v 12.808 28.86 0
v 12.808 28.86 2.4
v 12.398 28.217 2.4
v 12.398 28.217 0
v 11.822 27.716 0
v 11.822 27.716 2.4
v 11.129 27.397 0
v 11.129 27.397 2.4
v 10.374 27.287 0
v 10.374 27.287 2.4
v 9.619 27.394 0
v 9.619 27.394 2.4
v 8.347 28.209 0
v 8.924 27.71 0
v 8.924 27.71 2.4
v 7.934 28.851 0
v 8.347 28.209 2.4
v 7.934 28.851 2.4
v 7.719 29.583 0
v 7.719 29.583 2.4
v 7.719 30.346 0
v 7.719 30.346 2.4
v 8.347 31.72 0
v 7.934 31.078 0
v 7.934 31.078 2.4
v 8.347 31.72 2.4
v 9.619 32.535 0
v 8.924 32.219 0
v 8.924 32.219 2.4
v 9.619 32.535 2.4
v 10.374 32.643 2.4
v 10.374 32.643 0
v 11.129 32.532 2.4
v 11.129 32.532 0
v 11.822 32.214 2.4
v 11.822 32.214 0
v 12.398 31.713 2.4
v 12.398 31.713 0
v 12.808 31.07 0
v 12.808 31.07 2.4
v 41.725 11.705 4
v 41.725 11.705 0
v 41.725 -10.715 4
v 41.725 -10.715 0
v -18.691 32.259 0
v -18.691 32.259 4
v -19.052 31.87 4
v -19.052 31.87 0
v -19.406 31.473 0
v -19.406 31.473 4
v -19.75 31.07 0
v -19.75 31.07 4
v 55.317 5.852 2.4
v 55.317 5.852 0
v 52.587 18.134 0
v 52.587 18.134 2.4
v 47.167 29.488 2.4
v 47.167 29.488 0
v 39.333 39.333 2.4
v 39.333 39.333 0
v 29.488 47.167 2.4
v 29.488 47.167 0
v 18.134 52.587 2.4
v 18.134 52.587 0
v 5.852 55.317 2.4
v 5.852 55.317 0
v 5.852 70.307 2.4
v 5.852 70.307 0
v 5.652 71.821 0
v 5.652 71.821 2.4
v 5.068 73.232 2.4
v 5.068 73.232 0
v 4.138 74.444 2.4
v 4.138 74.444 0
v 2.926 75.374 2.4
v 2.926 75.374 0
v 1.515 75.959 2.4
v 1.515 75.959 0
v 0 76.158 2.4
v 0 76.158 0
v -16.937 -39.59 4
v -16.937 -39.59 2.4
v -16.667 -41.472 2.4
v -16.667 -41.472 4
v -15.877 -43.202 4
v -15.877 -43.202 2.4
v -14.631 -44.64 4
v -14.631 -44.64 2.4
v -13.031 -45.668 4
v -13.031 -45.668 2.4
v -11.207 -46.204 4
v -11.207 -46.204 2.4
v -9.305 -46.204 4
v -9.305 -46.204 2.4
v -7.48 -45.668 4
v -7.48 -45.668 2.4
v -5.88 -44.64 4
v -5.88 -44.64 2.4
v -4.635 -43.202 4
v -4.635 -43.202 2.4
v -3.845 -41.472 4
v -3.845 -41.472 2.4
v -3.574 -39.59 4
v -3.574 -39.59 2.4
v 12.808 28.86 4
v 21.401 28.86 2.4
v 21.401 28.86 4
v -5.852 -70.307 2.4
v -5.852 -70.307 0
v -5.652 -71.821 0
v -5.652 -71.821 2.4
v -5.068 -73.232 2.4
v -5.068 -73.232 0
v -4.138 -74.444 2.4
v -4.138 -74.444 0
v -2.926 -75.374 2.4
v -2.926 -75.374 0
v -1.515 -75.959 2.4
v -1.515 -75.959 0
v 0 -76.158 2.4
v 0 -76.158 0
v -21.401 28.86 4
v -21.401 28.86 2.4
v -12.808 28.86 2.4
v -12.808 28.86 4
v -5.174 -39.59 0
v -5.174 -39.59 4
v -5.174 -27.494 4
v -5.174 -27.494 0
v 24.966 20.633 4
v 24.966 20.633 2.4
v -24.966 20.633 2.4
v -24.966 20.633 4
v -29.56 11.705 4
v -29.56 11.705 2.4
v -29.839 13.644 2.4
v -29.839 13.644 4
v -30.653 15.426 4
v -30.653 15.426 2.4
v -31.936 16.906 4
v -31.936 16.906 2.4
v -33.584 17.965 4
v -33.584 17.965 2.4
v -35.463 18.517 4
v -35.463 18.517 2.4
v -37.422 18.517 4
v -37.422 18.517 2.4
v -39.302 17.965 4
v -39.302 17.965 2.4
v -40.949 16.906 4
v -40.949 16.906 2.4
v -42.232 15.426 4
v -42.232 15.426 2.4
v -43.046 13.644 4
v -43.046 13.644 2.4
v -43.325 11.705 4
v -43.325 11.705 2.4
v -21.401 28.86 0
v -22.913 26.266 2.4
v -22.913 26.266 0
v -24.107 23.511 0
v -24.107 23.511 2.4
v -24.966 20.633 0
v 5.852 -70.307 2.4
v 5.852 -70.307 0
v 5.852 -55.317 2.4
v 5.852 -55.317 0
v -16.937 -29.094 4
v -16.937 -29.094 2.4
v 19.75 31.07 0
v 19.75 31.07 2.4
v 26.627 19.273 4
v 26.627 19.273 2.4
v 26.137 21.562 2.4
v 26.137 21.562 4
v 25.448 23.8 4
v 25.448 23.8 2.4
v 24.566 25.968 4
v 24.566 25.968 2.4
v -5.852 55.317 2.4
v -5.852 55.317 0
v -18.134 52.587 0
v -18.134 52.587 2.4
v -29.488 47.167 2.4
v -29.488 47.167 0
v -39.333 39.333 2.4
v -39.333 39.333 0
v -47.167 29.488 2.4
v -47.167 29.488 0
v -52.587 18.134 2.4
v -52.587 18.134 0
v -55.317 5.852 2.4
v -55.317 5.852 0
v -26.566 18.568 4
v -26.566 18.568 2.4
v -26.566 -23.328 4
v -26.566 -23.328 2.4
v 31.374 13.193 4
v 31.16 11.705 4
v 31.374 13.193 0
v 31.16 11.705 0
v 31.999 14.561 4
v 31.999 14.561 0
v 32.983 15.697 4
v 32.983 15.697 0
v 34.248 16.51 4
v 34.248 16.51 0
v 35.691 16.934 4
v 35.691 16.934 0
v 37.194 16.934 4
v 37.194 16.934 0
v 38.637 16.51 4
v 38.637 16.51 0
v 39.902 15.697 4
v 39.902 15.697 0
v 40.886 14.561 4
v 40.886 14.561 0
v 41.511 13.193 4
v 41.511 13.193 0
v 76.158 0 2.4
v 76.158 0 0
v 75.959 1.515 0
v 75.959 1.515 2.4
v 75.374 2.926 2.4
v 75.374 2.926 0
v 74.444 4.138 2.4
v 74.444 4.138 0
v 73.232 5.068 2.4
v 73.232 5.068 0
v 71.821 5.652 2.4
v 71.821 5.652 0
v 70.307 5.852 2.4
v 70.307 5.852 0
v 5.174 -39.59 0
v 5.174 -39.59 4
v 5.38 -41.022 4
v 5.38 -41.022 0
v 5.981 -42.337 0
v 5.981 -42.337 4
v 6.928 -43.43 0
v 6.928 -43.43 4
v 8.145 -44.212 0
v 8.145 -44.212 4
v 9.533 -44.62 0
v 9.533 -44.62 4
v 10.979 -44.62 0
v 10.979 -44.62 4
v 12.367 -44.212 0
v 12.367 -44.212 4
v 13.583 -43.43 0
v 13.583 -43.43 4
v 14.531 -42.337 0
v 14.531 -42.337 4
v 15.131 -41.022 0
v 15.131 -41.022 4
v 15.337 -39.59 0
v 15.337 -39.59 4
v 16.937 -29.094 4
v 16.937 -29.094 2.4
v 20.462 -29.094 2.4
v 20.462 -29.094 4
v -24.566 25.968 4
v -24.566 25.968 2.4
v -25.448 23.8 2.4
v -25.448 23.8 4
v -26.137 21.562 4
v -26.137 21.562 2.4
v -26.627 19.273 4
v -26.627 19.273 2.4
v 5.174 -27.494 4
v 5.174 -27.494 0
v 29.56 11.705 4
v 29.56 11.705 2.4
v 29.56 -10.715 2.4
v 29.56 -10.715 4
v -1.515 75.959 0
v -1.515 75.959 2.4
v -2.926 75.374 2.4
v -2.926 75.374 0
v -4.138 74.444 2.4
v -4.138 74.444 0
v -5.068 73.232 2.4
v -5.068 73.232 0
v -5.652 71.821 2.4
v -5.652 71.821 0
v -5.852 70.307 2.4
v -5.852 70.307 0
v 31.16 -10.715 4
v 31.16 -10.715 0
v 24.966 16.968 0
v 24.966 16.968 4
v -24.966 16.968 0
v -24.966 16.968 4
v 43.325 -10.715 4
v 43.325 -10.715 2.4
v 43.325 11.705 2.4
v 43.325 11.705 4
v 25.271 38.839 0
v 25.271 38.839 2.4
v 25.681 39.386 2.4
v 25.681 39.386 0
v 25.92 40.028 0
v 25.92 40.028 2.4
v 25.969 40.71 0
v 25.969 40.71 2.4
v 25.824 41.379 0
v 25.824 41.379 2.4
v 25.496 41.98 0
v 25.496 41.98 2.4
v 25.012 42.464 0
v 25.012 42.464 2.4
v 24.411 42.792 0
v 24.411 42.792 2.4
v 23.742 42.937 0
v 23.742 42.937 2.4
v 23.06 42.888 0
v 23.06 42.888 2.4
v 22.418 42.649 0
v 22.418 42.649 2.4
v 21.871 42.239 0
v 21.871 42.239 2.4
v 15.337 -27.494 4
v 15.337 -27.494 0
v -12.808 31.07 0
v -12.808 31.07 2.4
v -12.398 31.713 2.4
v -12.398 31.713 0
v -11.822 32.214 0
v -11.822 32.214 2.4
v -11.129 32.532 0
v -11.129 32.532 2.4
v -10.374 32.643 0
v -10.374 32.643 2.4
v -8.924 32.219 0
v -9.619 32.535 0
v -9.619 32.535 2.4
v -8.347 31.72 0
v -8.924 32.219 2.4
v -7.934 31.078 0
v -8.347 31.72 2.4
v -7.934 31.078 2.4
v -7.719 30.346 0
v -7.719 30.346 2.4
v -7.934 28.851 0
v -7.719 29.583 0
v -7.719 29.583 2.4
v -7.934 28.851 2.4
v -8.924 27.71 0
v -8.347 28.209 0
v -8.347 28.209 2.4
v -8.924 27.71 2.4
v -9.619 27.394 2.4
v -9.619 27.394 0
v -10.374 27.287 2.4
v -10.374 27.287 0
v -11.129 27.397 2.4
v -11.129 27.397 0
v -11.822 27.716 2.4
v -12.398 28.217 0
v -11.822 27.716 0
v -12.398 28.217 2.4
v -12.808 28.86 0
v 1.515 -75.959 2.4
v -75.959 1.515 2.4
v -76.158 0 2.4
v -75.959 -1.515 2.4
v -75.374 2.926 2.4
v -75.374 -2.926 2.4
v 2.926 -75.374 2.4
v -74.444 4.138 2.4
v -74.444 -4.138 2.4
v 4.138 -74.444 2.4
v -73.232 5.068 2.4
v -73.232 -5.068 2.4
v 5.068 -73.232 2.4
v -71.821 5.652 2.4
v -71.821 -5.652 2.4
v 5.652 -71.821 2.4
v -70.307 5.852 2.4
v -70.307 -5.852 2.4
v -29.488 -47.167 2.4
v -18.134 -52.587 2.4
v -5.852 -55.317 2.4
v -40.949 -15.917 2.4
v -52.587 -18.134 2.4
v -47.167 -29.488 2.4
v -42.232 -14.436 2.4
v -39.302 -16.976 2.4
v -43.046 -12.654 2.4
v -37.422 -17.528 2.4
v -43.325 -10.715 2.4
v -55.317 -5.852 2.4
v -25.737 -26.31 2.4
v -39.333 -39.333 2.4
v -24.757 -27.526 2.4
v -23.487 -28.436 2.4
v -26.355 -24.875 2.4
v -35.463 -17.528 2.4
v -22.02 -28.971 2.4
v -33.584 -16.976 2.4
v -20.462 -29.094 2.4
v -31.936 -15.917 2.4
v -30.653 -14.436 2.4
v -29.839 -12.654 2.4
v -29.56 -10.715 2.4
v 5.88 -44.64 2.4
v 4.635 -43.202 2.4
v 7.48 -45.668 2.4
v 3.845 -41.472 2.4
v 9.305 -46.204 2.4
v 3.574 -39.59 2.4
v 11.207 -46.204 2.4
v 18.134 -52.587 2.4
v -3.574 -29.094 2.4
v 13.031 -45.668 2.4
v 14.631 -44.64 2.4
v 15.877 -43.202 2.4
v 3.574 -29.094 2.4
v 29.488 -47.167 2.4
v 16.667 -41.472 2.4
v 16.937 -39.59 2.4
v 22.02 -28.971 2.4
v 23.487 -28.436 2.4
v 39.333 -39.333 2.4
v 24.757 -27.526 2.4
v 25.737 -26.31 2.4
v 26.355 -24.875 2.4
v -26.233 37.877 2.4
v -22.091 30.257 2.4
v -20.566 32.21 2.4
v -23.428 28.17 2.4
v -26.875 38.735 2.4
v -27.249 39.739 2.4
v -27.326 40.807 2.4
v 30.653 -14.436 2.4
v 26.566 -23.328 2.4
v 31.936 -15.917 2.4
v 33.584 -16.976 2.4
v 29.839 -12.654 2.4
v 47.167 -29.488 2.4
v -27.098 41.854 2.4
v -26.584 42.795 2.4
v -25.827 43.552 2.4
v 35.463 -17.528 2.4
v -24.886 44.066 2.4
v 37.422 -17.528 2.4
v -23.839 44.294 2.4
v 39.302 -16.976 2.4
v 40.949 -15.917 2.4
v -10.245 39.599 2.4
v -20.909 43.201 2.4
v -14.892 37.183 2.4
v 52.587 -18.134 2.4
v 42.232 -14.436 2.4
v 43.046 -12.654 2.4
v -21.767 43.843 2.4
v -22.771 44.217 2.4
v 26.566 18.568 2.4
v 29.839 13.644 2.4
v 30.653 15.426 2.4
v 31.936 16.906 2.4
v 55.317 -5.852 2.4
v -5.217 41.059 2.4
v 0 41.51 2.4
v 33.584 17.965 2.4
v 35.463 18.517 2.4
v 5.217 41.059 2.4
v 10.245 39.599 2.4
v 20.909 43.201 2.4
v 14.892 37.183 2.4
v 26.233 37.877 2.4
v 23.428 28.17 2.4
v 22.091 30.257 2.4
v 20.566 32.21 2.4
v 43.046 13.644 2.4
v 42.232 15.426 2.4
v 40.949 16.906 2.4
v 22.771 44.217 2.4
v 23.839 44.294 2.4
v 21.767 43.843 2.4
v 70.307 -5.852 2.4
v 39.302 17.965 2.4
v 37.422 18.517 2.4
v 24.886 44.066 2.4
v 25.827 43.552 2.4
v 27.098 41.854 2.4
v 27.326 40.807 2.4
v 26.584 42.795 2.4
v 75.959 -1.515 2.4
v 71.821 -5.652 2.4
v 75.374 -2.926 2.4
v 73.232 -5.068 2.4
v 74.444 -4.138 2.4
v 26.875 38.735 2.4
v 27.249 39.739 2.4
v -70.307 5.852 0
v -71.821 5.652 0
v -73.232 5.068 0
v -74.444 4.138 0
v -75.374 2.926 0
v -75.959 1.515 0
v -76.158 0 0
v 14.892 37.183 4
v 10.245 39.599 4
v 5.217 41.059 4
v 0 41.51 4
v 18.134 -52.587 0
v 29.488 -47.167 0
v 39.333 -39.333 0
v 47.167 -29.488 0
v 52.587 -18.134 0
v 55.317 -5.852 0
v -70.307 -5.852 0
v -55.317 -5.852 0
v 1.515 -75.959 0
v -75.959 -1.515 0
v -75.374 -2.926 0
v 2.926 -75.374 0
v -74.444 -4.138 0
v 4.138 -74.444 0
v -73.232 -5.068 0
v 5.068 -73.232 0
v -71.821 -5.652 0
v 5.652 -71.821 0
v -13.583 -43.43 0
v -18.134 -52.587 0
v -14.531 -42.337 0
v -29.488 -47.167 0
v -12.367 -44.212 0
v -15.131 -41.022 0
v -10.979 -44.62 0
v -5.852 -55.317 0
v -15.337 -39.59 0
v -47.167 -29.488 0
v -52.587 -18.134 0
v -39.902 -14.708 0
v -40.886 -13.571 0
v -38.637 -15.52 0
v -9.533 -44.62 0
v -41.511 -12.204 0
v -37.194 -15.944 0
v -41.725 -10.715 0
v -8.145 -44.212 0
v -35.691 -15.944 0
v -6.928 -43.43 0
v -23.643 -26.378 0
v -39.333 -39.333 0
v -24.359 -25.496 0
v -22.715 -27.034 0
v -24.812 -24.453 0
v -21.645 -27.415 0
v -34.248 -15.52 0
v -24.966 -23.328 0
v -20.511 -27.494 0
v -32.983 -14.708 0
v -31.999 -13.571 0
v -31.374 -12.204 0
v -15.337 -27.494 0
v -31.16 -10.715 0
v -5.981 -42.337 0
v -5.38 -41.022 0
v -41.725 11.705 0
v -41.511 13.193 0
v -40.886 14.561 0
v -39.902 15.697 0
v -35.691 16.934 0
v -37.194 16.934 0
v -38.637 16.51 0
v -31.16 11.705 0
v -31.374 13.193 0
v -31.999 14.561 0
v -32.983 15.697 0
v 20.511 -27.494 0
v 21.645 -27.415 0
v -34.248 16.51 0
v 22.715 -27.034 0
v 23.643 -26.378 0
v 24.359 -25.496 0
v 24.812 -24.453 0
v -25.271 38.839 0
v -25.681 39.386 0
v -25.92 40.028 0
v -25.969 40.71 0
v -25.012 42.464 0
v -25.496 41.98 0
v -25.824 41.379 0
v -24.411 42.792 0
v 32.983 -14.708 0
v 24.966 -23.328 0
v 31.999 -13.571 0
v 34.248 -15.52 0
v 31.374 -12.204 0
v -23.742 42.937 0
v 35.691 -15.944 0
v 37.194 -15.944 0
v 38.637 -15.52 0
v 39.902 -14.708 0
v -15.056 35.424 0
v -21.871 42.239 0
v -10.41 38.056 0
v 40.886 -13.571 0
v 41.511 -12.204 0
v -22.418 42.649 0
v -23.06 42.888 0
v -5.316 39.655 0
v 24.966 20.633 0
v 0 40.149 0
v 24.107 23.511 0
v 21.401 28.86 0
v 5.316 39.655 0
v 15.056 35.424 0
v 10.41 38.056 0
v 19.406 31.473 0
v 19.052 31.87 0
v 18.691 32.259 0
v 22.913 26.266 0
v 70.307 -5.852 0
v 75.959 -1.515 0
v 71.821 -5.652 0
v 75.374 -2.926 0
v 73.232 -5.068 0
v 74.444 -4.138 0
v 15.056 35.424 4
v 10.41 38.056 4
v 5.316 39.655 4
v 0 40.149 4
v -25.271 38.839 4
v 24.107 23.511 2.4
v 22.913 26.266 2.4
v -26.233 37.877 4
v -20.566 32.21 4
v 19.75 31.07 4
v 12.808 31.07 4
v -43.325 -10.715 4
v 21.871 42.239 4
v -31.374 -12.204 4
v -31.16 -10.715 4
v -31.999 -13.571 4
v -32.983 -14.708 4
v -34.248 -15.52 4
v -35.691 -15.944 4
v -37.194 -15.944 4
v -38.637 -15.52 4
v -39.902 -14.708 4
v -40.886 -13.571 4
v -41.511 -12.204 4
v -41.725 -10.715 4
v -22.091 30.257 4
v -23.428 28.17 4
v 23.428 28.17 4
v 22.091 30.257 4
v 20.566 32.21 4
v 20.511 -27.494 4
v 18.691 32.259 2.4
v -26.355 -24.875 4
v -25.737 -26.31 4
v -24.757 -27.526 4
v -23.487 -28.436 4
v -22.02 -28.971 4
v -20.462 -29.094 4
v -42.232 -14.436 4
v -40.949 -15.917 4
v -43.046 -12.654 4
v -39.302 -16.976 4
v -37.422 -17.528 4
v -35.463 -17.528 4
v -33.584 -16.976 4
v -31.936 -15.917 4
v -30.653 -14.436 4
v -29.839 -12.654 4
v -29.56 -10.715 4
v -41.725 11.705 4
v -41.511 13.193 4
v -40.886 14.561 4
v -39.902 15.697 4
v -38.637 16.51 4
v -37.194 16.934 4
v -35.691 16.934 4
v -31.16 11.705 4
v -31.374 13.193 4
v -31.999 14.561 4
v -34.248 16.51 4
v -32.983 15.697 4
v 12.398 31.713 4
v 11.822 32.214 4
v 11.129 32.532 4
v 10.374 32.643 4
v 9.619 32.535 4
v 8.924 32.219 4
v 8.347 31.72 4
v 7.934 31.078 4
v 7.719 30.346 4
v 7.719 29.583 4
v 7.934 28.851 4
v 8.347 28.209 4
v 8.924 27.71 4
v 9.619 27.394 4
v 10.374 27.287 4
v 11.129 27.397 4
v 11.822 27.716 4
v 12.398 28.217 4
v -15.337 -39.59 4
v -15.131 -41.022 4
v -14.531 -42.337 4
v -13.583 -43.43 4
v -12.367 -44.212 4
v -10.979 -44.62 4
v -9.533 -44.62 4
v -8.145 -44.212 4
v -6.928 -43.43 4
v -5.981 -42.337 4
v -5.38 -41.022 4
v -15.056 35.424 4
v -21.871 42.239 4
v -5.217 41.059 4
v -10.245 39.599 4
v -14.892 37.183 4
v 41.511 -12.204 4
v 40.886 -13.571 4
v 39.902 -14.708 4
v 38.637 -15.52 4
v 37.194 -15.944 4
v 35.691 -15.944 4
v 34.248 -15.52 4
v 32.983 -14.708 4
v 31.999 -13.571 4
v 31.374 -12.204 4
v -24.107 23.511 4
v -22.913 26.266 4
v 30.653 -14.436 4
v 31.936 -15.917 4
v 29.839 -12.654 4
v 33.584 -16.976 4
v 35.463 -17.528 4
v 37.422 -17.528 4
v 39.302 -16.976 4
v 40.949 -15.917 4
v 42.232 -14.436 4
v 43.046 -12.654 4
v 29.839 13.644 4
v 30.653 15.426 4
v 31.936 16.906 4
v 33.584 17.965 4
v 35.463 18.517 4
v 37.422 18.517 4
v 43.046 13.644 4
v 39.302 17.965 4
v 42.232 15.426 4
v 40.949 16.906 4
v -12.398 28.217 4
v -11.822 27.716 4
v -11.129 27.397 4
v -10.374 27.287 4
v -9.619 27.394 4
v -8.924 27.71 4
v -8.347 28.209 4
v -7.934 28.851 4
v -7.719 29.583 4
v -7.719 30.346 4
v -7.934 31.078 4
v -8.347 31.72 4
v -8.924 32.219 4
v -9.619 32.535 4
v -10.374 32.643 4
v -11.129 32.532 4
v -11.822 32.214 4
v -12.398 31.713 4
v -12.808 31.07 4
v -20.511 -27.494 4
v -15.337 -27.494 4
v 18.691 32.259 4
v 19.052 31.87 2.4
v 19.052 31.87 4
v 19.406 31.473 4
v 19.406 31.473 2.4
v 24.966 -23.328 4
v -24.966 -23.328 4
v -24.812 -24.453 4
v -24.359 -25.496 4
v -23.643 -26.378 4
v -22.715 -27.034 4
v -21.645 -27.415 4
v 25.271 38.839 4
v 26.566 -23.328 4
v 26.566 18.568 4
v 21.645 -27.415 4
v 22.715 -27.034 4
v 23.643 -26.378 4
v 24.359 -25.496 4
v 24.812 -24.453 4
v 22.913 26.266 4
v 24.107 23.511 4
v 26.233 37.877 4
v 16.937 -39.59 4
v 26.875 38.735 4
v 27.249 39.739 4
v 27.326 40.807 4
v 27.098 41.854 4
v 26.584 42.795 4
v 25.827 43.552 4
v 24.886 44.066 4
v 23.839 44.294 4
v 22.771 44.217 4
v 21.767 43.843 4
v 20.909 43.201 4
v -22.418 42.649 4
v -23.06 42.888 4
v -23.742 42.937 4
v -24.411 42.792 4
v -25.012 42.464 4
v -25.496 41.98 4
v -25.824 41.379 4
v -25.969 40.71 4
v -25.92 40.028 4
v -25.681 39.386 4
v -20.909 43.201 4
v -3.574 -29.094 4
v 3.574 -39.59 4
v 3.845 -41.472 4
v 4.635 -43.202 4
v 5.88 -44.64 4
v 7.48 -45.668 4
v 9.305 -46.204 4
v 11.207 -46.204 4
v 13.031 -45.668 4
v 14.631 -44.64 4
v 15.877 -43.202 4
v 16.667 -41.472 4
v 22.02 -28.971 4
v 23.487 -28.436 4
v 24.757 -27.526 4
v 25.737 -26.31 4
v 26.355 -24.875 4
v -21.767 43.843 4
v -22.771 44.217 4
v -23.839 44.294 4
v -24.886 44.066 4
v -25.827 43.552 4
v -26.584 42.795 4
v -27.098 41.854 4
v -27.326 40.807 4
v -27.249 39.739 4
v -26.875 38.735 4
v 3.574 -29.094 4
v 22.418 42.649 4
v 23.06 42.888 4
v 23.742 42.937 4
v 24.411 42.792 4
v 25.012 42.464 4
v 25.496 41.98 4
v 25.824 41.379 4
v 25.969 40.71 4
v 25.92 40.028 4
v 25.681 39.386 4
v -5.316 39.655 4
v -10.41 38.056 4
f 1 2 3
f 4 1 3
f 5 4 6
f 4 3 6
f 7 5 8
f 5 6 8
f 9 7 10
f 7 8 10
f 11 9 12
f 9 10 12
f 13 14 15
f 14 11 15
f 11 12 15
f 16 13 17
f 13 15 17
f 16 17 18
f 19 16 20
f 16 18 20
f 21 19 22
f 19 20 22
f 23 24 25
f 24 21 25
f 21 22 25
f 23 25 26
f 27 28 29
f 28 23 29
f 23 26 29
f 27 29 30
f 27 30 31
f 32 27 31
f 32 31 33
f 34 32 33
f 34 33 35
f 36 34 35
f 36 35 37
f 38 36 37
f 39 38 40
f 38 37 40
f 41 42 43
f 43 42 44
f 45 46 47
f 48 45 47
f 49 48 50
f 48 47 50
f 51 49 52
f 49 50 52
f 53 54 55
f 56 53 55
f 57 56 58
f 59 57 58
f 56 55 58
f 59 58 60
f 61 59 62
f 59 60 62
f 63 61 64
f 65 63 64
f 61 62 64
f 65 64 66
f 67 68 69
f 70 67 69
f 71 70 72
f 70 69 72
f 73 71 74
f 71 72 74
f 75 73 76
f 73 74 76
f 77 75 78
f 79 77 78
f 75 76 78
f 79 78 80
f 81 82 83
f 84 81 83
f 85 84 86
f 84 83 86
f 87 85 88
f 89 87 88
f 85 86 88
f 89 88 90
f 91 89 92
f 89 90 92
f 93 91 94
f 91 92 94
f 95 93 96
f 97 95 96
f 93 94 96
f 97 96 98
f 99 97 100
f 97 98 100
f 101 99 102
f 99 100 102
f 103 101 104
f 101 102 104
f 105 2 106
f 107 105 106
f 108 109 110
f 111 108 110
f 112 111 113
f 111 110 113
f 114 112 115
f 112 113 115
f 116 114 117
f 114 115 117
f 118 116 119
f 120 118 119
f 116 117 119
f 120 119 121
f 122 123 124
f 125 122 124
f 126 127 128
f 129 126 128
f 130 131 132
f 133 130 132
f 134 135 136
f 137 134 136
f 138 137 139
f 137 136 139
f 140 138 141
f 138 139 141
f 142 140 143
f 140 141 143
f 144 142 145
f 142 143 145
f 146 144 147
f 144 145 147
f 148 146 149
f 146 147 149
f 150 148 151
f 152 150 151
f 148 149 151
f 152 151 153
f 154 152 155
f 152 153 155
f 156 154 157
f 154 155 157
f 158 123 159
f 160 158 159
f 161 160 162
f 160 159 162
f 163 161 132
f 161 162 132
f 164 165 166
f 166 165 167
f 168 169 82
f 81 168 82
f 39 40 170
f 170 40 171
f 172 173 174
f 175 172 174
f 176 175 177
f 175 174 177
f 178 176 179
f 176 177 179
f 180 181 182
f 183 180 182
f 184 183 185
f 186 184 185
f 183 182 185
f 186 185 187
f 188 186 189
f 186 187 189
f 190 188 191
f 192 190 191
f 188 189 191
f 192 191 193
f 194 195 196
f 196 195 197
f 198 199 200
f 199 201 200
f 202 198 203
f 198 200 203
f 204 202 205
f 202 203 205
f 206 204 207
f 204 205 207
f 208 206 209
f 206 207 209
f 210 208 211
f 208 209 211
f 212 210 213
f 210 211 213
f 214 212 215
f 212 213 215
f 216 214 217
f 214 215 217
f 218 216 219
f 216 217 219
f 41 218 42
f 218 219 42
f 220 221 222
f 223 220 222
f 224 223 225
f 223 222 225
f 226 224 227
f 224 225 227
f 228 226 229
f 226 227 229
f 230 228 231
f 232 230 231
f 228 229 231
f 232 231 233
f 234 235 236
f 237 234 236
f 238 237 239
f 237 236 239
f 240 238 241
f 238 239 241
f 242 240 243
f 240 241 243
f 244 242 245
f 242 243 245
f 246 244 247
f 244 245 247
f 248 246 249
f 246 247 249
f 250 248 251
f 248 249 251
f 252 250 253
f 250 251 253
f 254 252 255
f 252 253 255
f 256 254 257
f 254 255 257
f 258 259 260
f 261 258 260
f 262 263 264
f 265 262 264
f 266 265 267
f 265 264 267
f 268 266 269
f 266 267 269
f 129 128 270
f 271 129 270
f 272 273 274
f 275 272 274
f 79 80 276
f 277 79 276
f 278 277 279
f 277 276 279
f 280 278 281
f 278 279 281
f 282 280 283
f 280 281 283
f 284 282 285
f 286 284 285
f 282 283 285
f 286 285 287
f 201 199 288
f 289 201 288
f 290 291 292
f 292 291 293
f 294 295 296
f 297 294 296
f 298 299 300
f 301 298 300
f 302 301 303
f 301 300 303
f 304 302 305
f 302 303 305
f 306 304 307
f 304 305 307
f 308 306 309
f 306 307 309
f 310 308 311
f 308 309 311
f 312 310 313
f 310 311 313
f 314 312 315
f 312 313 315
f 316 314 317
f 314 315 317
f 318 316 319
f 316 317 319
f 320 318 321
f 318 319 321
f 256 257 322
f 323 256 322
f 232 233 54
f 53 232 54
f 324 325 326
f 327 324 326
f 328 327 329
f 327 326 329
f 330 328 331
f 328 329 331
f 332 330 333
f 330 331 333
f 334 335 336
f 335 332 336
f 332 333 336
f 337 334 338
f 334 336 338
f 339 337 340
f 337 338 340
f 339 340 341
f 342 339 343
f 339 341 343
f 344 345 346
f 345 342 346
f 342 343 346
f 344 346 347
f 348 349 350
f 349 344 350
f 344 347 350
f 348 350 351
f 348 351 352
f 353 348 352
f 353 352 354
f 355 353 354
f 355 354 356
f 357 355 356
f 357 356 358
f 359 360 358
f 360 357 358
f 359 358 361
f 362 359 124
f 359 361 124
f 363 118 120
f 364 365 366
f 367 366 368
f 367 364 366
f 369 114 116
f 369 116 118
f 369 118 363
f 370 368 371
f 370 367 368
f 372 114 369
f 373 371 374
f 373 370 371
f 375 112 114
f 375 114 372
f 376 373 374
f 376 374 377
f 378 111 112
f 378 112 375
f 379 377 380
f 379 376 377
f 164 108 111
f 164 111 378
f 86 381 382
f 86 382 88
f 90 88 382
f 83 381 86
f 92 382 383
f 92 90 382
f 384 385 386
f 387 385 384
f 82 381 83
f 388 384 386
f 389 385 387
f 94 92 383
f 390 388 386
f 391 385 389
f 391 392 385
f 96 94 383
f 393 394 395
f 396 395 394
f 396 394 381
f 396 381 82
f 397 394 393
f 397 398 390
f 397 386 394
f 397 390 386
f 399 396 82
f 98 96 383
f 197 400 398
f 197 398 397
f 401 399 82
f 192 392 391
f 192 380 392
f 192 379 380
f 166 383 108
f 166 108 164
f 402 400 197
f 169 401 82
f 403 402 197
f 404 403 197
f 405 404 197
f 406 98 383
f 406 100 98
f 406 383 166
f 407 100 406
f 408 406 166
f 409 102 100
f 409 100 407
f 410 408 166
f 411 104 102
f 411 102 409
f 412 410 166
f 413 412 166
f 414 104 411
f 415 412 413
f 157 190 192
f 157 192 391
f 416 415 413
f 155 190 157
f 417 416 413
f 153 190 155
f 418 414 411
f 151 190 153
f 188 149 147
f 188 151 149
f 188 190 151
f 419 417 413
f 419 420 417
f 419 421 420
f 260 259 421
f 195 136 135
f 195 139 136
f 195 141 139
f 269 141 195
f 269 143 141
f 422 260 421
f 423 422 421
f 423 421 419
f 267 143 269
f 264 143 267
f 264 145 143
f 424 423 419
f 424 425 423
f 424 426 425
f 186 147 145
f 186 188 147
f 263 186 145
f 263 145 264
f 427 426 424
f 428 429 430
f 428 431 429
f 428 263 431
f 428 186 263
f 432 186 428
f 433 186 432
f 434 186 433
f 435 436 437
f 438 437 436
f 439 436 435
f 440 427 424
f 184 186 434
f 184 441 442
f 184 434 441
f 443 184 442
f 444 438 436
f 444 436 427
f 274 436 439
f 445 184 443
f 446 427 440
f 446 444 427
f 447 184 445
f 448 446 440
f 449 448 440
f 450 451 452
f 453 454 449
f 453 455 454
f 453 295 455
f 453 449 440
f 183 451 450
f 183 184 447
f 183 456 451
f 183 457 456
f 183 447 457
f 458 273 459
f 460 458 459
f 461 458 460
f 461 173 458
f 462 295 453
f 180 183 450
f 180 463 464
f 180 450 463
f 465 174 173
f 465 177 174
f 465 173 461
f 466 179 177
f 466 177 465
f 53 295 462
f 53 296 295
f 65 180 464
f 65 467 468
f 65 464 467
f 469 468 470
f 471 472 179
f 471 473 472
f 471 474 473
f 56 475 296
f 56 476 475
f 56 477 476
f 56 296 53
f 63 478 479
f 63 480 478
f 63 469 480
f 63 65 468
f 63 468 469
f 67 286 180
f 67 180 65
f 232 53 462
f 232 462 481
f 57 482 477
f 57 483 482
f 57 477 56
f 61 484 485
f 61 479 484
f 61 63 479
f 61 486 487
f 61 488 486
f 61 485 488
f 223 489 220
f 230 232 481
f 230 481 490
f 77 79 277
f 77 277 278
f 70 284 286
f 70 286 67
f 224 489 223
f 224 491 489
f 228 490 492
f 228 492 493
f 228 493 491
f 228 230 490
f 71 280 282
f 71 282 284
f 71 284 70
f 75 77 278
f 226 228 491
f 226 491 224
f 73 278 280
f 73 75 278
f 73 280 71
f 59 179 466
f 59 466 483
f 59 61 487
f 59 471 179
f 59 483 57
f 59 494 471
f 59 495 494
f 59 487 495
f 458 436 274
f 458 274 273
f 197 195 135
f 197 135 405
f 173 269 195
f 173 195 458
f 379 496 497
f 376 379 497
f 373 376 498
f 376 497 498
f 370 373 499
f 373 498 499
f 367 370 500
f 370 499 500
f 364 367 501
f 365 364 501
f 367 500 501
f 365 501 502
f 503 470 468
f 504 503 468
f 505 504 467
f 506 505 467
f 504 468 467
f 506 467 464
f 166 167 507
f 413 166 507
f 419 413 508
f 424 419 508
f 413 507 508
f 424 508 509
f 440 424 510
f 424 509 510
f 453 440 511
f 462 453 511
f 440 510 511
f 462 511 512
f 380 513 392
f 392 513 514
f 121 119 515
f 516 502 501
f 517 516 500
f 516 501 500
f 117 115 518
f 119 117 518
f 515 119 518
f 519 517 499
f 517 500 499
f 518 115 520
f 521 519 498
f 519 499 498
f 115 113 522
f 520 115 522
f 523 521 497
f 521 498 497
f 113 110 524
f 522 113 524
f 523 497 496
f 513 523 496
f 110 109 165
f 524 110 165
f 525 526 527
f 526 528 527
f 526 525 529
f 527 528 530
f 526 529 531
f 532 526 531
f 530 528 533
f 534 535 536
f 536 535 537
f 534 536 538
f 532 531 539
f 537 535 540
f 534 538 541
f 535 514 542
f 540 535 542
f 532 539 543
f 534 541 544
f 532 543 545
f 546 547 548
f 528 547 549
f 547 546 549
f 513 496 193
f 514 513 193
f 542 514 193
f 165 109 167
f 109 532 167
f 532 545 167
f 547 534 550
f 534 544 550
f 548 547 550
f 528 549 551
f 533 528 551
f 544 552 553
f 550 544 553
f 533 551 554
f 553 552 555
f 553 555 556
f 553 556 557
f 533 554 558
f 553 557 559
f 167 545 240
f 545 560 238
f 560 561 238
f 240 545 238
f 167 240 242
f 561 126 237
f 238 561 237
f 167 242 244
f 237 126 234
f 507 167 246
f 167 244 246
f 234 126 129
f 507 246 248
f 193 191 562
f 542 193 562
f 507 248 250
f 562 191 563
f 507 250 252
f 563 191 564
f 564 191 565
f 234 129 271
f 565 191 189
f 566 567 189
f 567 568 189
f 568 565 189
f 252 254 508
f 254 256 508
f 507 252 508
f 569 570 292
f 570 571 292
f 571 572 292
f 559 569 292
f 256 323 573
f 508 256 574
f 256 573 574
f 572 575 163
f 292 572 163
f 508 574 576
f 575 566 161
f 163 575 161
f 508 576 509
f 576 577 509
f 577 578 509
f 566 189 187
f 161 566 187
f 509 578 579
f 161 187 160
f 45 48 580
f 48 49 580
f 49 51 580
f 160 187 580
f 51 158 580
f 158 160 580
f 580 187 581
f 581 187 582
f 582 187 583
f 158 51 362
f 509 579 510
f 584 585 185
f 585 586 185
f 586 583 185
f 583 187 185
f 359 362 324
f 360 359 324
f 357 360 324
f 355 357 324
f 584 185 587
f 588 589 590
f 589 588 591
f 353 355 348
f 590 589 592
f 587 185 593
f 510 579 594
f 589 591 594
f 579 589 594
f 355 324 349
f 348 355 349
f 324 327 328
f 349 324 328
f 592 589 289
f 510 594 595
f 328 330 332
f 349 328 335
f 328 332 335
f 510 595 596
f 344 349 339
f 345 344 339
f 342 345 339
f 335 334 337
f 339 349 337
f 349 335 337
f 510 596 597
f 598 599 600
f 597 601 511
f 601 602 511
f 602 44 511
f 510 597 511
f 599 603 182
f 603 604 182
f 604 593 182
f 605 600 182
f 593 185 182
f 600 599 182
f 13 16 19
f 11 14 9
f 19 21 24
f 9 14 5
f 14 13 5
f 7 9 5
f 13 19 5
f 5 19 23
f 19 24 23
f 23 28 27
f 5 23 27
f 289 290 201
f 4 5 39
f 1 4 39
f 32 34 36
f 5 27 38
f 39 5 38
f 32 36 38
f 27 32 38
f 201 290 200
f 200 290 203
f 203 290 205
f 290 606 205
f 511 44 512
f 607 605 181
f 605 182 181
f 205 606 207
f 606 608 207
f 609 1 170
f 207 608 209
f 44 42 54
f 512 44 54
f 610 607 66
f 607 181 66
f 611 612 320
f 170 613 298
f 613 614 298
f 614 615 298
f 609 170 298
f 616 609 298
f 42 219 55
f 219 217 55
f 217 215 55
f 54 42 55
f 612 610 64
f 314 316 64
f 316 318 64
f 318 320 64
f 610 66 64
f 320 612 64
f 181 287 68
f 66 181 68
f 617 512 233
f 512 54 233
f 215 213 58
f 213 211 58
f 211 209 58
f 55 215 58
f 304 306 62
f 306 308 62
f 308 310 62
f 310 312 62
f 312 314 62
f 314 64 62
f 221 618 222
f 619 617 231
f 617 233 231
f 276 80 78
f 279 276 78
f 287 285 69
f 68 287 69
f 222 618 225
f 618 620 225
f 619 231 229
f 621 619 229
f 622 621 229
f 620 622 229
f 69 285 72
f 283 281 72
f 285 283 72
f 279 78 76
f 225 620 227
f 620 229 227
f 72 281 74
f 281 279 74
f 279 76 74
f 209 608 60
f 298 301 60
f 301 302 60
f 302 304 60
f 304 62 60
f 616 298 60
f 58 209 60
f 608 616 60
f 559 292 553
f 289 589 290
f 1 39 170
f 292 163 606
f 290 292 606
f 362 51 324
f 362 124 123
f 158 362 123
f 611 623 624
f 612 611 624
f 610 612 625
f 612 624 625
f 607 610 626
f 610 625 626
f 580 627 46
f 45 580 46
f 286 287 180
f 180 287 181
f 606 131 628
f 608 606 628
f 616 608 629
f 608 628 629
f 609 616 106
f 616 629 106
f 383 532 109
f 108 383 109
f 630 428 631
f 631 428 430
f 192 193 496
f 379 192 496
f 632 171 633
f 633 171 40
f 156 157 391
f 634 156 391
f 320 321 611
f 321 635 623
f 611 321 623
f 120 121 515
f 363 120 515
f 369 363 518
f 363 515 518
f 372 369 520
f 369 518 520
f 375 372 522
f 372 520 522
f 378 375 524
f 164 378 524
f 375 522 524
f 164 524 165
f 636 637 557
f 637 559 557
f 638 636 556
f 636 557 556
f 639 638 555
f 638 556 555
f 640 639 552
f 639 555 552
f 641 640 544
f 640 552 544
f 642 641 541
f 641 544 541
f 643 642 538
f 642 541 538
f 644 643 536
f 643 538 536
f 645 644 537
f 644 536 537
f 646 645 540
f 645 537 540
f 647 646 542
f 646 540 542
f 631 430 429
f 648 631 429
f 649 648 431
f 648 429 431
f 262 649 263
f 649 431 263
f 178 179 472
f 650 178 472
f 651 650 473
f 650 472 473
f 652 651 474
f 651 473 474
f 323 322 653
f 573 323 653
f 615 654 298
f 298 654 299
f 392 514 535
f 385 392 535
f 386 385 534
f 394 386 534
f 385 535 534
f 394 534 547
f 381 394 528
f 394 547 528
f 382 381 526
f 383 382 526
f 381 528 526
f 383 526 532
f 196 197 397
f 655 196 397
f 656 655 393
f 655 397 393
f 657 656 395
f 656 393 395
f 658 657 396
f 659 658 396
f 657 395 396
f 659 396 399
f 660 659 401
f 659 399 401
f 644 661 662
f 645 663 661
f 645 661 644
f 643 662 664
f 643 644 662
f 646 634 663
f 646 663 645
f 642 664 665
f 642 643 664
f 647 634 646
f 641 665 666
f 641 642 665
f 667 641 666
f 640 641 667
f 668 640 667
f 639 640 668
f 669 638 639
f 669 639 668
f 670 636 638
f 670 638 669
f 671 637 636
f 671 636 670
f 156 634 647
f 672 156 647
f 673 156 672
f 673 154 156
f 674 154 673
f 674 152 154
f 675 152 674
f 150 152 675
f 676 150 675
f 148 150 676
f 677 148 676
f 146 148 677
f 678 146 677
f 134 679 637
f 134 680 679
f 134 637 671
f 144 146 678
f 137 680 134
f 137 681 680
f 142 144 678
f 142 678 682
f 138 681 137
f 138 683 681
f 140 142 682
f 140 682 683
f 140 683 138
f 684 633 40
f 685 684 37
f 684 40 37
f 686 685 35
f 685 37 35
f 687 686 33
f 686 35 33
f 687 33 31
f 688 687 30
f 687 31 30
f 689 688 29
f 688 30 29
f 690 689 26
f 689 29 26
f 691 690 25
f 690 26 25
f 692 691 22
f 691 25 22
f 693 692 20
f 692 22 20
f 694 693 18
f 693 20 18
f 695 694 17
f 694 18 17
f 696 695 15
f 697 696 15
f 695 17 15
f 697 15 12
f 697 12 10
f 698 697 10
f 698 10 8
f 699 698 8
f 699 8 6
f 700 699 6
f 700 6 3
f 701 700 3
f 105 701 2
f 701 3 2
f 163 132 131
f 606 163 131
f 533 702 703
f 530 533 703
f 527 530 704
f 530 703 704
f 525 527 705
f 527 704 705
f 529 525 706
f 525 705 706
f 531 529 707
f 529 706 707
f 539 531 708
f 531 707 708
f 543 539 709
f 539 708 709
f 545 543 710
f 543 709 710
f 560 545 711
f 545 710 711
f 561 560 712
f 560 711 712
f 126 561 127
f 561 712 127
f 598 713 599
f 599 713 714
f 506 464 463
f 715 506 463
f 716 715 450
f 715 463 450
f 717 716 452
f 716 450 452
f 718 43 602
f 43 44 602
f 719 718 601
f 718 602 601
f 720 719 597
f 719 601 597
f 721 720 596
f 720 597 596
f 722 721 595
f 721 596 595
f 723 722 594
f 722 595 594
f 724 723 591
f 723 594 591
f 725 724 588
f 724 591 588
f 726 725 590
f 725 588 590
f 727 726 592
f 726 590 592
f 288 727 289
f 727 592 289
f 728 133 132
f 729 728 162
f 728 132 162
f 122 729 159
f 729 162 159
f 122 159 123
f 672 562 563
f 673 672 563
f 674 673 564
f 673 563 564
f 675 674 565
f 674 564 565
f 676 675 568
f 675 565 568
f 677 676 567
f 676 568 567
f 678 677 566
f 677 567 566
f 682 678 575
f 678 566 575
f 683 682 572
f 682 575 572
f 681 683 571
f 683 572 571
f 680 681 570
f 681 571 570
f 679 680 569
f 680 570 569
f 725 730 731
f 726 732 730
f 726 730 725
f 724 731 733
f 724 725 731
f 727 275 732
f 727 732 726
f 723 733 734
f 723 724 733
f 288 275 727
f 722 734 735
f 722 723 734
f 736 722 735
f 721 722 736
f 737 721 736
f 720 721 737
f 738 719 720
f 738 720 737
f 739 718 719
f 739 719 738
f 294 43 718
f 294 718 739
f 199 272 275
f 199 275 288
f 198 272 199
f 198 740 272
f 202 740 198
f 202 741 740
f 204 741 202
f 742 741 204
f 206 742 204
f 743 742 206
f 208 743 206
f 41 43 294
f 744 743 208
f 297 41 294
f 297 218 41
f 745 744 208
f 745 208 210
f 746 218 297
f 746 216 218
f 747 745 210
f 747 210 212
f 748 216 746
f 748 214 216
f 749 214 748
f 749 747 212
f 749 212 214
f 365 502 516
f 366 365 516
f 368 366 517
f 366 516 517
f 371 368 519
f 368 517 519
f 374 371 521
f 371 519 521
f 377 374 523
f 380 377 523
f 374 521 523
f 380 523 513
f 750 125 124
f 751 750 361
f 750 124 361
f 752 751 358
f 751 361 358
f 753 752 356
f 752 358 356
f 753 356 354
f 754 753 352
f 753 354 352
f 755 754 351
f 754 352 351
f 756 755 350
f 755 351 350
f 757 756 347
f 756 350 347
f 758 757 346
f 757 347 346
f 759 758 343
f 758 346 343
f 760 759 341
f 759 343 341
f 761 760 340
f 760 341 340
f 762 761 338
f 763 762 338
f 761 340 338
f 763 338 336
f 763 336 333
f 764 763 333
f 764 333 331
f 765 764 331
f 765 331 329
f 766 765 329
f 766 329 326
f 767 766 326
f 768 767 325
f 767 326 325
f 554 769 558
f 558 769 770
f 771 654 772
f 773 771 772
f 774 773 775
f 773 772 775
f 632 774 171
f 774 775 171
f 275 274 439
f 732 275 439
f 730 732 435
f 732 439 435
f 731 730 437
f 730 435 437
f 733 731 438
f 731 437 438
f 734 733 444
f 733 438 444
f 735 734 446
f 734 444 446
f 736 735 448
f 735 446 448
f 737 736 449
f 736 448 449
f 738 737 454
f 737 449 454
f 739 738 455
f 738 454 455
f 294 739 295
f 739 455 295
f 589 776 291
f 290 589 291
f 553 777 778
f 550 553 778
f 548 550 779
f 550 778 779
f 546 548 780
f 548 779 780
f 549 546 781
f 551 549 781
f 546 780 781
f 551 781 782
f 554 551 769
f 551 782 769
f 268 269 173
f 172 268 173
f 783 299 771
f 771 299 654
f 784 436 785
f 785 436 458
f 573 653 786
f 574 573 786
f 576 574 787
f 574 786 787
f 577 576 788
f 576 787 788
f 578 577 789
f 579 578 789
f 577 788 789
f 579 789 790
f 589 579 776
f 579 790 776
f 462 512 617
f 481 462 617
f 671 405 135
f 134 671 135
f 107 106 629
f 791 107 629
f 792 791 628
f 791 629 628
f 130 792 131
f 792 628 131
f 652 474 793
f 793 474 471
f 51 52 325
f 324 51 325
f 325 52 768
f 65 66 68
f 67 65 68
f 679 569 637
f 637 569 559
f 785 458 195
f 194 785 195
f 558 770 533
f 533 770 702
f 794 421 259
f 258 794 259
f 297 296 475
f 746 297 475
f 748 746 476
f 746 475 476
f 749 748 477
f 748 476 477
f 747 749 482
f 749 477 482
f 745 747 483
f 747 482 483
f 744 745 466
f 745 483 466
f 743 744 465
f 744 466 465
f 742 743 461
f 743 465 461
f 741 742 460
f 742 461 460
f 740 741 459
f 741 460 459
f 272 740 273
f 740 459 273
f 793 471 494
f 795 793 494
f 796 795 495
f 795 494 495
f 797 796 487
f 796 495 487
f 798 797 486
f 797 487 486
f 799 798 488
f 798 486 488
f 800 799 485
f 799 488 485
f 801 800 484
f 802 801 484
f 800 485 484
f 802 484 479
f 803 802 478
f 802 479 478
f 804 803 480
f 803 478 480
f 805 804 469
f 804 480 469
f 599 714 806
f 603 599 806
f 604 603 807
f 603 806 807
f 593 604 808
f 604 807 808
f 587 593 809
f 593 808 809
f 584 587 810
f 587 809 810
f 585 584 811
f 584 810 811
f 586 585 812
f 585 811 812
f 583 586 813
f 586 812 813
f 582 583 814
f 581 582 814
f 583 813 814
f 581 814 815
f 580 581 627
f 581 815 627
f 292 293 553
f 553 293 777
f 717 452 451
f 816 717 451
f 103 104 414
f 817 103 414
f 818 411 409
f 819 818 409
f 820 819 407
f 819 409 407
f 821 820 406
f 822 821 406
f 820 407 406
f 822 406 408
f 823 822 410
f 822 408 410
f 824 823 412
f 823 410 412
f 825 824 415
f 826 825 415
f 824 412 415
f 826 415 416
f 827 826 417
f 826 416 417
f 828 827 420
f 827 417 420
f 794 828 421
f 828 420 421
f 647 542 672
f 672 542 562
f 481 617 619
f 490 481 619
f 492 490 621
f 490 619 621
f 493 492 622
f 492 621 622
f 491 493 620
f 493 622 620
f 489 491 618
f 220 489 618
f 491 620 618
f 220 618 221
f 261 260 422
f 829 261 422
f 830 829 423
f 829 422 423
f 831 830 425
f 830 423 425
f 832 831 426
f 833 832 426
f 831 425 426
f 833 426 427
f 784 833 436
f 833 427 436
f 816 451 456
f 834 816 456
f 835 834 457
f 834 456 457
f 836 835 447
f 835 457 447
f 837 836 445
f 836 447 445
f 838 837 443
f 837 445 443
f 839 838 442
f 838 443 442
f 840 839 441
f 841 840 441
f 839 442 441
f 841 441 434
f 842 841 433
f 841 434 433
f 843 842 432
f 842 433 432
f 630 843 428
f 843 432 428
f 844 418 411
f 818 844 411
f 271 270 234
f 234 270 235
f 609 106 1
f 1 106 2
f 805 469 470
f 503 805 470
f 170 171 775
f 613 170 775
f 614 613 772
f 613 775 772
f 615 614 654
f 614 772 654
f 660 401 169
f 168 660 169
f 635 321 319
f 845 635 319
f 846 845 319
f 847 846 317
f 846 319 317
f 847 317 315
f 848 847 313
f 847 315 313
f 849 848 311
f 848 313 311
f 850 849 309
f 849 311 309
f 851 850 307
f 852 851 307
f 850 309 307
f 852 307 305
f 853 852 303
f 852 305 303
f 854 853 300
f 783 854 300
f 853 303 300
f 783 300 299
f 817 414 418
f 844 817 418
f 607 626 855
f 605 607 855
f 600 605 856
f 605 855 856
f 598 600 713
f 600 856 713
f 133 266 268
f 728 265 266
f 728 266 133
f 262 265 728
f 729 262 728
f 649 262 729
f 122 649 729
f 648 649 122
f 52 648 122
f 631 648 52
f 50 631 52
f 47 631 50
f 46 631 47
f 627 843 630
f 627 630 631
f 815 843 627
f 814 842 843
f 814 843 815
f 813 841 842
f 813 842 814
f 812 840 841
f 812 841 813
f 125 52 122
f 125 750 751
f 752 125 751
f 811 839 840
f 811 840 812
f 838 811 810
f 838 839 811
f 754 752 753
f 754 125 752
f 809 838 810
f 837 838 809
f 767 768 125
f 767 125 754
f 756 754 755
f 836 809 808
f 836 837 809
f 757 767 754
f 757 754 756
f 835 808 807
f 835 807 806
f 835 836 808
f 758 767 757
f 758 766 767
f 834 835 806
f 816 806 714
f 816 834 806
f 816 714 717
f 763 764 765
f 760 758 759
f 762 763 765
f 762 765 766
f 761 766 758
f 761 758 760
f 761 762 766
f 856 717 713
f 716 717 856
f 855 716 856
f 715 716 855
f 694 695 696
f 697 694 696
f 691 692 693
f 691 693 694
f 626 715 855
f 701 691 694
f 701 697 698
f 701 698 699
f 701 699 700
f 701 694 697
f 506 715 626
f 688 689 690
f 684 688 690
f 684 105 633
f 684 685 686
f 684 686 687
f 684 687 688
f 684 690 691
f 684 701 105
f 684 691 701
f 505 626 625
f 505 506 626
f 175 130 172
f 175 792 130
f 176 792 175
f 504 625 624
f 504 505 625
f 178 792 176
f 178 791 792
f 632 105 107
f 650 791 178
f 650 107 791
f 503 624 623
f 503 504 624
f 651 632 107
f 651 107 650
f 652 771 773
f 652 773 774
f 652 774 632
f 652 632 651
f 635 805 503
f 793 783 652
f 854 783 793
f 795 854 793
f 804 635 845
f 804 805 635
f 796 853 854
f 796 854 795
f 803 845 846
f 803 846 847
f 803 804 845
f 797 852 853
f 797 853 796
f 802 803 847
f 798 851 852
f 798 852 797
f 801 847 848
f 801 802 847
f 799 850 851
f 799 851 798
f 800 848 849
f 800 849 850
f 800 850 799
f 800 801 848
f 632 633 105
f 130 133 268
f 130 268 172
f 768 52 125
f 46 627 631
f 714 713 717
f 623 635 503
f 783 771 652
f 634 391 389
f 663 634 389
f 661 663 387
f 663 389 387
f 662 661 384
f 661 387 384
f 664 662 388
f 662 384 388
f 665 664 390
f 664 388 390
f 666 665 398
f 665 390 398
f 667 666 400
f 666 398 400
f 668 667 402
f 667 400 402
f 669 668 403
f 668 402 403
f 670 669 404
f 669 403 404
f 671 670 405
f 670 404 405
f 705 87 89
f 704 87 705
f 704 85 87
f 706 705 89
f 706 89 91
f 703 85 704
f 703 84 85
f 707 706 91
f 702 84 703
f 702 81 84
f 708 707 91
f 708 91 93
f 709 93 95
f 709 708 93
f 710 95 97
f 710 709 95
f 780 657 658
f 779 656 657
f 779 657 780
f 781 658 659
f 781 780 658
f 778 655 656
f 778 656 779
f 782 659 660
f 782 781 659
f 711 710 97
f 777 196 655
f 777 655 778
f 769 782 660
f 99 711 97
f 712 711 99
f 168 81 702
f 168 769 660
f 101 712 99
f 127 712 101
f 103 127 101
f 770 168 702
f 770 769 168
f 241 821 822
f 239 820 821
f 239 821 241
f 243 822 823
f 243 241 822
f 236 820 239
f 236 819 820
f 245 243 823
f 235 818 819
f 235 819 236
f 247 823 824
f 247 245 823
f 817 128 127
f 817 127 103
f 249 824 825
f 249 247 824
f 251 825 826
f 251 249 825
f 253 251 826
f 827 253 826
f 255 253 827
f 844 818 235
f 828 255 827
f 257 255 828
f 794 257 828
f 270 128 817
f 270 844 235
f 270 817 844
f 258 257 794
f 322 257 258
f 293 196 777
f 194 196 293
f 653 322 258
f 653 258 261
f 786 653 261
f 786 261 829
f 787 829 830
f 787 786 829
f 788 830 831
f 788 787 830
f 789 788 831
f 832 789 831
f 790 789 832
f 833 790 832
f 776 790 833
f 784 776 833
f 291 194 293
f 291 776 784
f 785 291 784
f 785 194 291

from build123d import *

# Parameters (mm, degrees)
F1_DEPTH = 3
F3_DEPTH = 25
F5_DEPTH = 2
F6_SCALE = 0.8


with BuildPart() as f1:
    # F0 (on Top) → F1 (new body)
    with BuildSketch(Plane.XY):
        with BuildLine():
            ThreePointArc((69.1465082783, -7.3148026297), (69.4358131239, -3.6624855503), (69.532337402, 0))
            ThreePointArc((69.532337402, 0), (69.4358131239, 3.6624855503), (69.1465082783, 7.3148026297))
            ThreePointArc((69.1465082783, 7.3148026297), (49.1667872887, 49.1667872887), (7.3148026297, 69.1465082783))
            ThreePointArc((7.3148026297, 69.1465082783), (0, 69.532337402), (-7.3148026297, 69.1465082783))
            ThreePointArc((-7.3148026297, 69.1465082783), (-49.1667872887, 49.1667872887), (-69.1465082783, 7.3148026297))
            ThreePointArc((-69.1465082783, 7.3148026297), (-69.532337402, 0), (-69.1465082783, -7.3148026297))
            ThreePointArc((-69.1465082783, -7.3148026297), (-49.1667872887, -49.1667872887), (-7.3148026297, -69.1465082783))
            ThreePointArc((-7.3148026297, -69.1465082783), (0, -69.532337402), (7.3148026297, -69.1465082783))
            ThreePointArc((7.3148026297, -69.1465082783), (49.1667872887, -49.1667872887), (69.1465082783, -7.3148026297))
        make_face()
        with BuildLine():
            ThreePointArc((69.1465082783, 7.3148026297), (69.4358131239, 3.6624855503), (69.532337402, 0))
            ThreePointArc((69.532337402, 0), (69.4358131239, -3.6624855503), (69.1465082783, -7.3148026297))
            Line((69.1465082783, -7.3148026297), (87.8831749798, -7.3148026297))
            ThreePointArc((87.8831749798, -7.3148026297), (93.0555215223, -5.1723465425), (95.1979776095, 0))
            ThreePointArc((95.1979776095, 0), (93.0555215223, 5.1723465425), (87.8831749798, 7.3148026297))
            Line((87.8831749798, 7.3148026297), (69.1465082783, 7.3148026297))
        make_face()
        with BuildLine():
            ThreePointArc((-7.3148026297, 69.1465082783), (0, 69.532337402), (7.3148026297, 69.1465082783))
            Line((7.3148026297, 69.1465082783), (7.3148026297, 87.8831749798))
            ThreePointArc((7.3148026297, 87.8831749798), (5.1723465425, 93.0555215223), (0, 95.1979776095))
            ThreePointArc((0, 95.1979776095), (-5.1723465425, 93.0555215223), (-7.3148026297, 87.8831749798))
            Line((-7.3148026297, 87.8831749798), (-7.3148026297, 69.1465082783))
        make_face()
        with BuildLine():
            Line((7.3148026297, -87.8831749798), (7.3148026297, -69.1465082783))
            ThreePointArc((7.3148026297, -69.1465082783), (0, -69.532337402), (-7.3148026297, -69.1465082783))
            Line((-7.3148026297, -69.1465082783), (-7.3148026297, -87.8831749798))
            ThreePointArc((-7.3148026297, -87.8831749798), (-5.1723465425, -93.0555215223), (0, -95.1979776095))
            ThreePointArc((0, -95.1979776095), (5.1723465425, -93.0555215223), (7.3148026297, -87.8831749798))
        make_face()
        with BuildLine():
            ThreePointArc((-69.1465082783, -7.3148026297), (-69.532337402, 0), (-69.1465082783, 7.3148026297))
            Line((-69.1465082783, 7.3148026297), (-87.8831749798, 7.3148026297))
            ThreePointArc((-87.8831749798, 7.3148026297), (-93.0555215223, 5.1723465425), (-95.1979776095, 0))
            ThreePointArc((-95.1979776095, 0), (-93.0555215223, -5.1723465425), (-87.8831749798, -7.3148026297))
            Line((-87.8831749798, -7.3148026297), (-69.1465082783, -7.3148026297))
        make_face()
    extrude(amount=F1_DEPTH)

    # F2 (on face) → F3 (cut)
    with BuildSketch(Plane.XY.offset(3)):
        with BuildLine():
            ThreePointArc((-38.9502607286, 14.6313095465), (-45.5531459302, 21.2341947481), (-52.1560311317, 14.6313095465))
            Line((-52.1560311317, 14.6313095465), (-52.1560311317, -13.3942700922))
            ThreePointArc((-52.1560311317, -13.3942700922), (-45.5531459302, -19.9971552938), (-38.9502607286, -13.3942700922))
            Line((-38.9502607286, -13.3942700922), (-38.9502607286, 14.6313095465))
        make_face()
        with BuildLine():
            Line((0, 21.2101340294), (-31.2078986317, 21.2101340294))
            Line((-31.2078986317, 21.2101340294), (-31.2078986317, -29.1595514864))
            ThreePointArc((-31.2078986317, -29.1595514864), (-29.5536377946, -32.97196325), (-25.6393177885, -34.3680869058))
            Line((-25.6393177885, -34.3680869058), (-19.1715068486, -34.3680869058))
            Line((-19.1715068486, -34.3680869058), (-19.1715068486, -49.4875834141))
            ThreePointArc((-19.1715068486, -49.4875834141), (-12.8196588942, -55.8394313684), (-6.4678109399, -49.4875834141))
            Line((-6.4678109399, -49.4875834141), (-6.4678109399, -34.3680869058))
            Line((-6.4678109399, -34.3680869058), (0, -34.3680869058))
            Line((0, -34.3680869058), (6.4678109399, -34.3680869058))
            Line((6.4678109399, -34.3680869058), (6.4678109399, -49.4875834141))
            ThreePointArc((6.4678109399, -49.4875834141), (12.8196588942, -55.8394313684), (19.1715068486, -49.4875834141))
            Line((19.1715068486, -49.4875834141), (19.1715068486, -34.3680869058))
            Line((19.1715068486, -34.3680869058), (25.6393177885, -34.3680869058))
            ThreePointArc((25.6393177885, -34.3680869058), (29.5536377946, -32.97196325), (31.2078986317, -29.1595514864))
            Line((31.2078986317, -29.1595514864), (31.2078986317, 21.2101340294))
            Line((31.2078986317, 21.2101340294), (0, 21.2101340294))
        make_face()
        with BuildLine():
            ThreePointArc((38.9502607286, -13.3942700922), (45.5531459302, -19.9971552938), (52.1560311317, -13.3942700922))
            Line((52.1560311317, -13.3942700922), (52.1560311317, 14.6313095465))
            ThreePointArc((52.1560311317, 14.6313095465), (45.5531459302, 21.2341947481), (38.9502607286, 14.6313095465))
            Line((38.9502607286, 14.6313095465), (38.9502607286, -13.3942700922))
        make_face()
        with BuildLine():
            ThreePointArc((18.8199247983, 44.2805681259), (9.8819802161, 48.7377457179), (0, 50.1867979765))
            ThreePointArc((0, 50.1867979765), (-9.8819802161, 48.7377457179), (-18.8199247983, 44.2805681259))
            Line((-18.8199247983, 44.2805681259), (-27.3381436975, 52.7987870252))
            ThreePointArc((-27.3381436975, 52.7987870252), (-31.5886529958, 52.7987870252), (-31.5886529958, 48.5482777269))
            Line((-31.5886529958, 48.5482777269), (-23.3639563844, 40.3235811155))
            ThreePointArc((-23.3639563844, 40.3235811155), (-24.0375361692, 39.5906852357), (-24.6877279792, 38.8369633325))
            Line((-24.6877279792, 38.8369633325), (-16.0106173244, 38.8369633325))
            ThreePointArc((-16.0106173244, 38.8369633325), (-9.6142565188, 37.4559091891), (-16.0106173244, 36.0748550456))
            Line((-16.0106173244, 36.0748550456), (-26.7508904588, 36.0748550456))
            ThreePointArc((-26.7508904588, 36.0748550456), (-29.4383336901, 31.1322164007), (-31.2078986317, 25.7917419076))
            Line((-31.2078986317, 25.7917419076), (0, 25.7917419076))
            Line((0, 25.7917419076), (31.2078986317, 25.7917419076))
            ThreePointArc((31.2078986317, 25.7917419076), (29.4383336901, 31.1322164007), (26.7508904588, 36.0748550456))
            Line((26.7508904588, 36.0748550456), (16.0106173244, 36.0748550456))
            ThreePointArc((16.0106173244, 36.0748550456), (9.6142565188, 37.4559091891), (16.0106173244, 38.8369633325))
            Line((16.0106173244, 38.8369633325), (24.6877279792, 38.8369633325))
            ThreePointArc((24.6877279792, 38.8369633325), (24.0375361692, 39.5906852357), (23.3639563844, 40.3235811155))
            Line((23.3639563844, 40.3235811155), (31.5886529958, 48.5482777269))
            ThreePointArc((31.5886529958, 48.5482777269), (31.5886529958, 52.7987870252), (27.3381436975, 52.7987870252))
            Line((27.3381436975, 52.7987870252), (18.8199247983, 44.2805681259))
        make_face()
    extrude(amount=-F3_DEPTH, mode=Mode.SUBTRACT)

    # F4 (on face) → F5 (join)
    with BuildSketch(Plane.XY.offset(3)):
        with BuildLine():
            Line((-36.9502607286, -13.3942700922), (-36.9502607286, 14.6313095465))
            ThreePointArc((-36.9502607286, 14.6313095465), (-45.5531459302, 23.2341947481), (-54.1560311317, 14.6313095465))
            Line((-54.1560311317, 14.6313095465), (-54.1560311317, -13.3942700922))
            ThreePointArc((-54.1560311317, -13.3942700922), (-45.5531459302, -21.9971552938), (-36.9502607286, -13.3942700922))
        make_face()
        with BuildLine():
            ThreePointArc((-38.9502607286, -13.3942700922), (-45.5531459302, -19.9971552938), (-52.1560311317, -13.3942700922))
            Line((-52.1560311317, -13.3942700922), (-52.1560311317, 14.6313095465))
            ThreePointArc((-52.1560311317, 14.6313095465), (-45.5531459302, 21.2341947481), (-38.9502607286, 14.6313095465))
            Line((-38.9502607286, 14.6313095465), (-38.9502607286, -13.3942700922))
        make_face(mode=Mode.SUBTRACT)
        with BuildLine():
            Line((33.2078986317, -29.1595514864), (33.2078986317, 23.2101340294))
            Line((33.2078986317, 23.2101340294), (-33.2078986317, 23.2101340294))
            Line((-33.2078986317, 23.2101340294), (-33.2078986317, -29.1595514864))
            ThreePointArc((-33.2078986317, -29.1595514864), (-30.9461517209, -34.4078767665), (-25.5779123872, -36.3680869058))
            Line((-25.5779123872, -36.3680869058), (-21.1715068486, -36.3680869058))
            Line((-21.1715068486, -36.3680869058), (-21.1715068486, -49.4875834141))
            ThreePointArc((-21.1715068486, -49.4875834141), (-12.8196588942, -57.8394313684), (-4.4678109399, -49.4875834141))
            Line((-4.4678109399, -49.4875834141), (-4.4678109399, -36.3680869058))
            Line((-4.4678109399, -36.3680869058), (4.4678109399, -36.3680869058))
            Line((4.4678109399, -36.3680869058), (4.4678109399, -49.4875834141))
            ThreePointArc((4.4678109399, -49.4875834141), (12.8196588942, -57.8394313684), (21.1715068486, -49.4875834141))
            Line((21.1715068486, -49.4875834141), (21.1715068486, -36.3680869058))
            Line((21.1715068486, -36.3680869058), (25.5779123872, -36.3680869058))
            ThreePointArc((25.5779123872, -36.3680869058), (30.9461517209, -34.4078767665), (33.2078986317, -29.1595514864))
        make_face()
        with BuildLine():
            Line((31.2078986317, 21.2101340294), (31.2078986317, -29.1595514864))
            ThreePointArc((31.2078986317, -29.1595514864), (29.5536377946, -32.97196325), (25.6393177885, -34.3680869058))
            Line((25.6393177885, -34.3680869058), (19.1715068486, -34.3680869058))
            Line((19.1715068486, -34.3680869058), (19.1715068486, -49.4875834141))
            ThreePointArc((19.1715068486, -49.4875834141), (12.8196588942, -55.8394313684), (6.4678109399, -49.4875834141))
            Line((6.4678109399, -49.4875834141), (6.4678109399, -34.3680869058))
            Line((6.4678109399, -34.3680869058), (-6.4678109399, -34.3680869058))
            Line((-6.4678109399, -34.3680869058), (-6.4678109399, -49.4875834141))
            ThreePointArc((-6.4678109399, -49.4875834141), (-12.8196588942, -55.8394313684), (-19.1715068486, -49.4875834141))
            Line((-19.1715068486, -49.4875834141), (-19.1715068486, -34.3680869058))
            Line((-19.1715068486, -34.3680869058), (-25.6393177885, -34.3680869058))
            ThreePointArc((-25.6393177885, -34.3680869058), (-29.5536377946, -32.97196325), (-31.2078986317, -29.1595514864))
            Line((-31.2078986317, -29.1595514864), (-31.2078986317, 21.2101340294))
            Line((-31.2078986317, 21.2101340294), (31.2078986317, 21.2101340294))
        make_face(mode=Mode.SUBTRACT)
        with BuildLine():
            ThreePointArc((54.1560311317, 14.6313095465), (45.5531459302, 23.2341947481), (36.9502607286, 14.6313095465))
            Line((36.9502607286, 14.6313095465), (36.9502607286, -13.3942700922))
            ThreePointArc((36.9502607286, -13.3942700922), (45.5531459302, -21.9971552938), (54.1560311317, -13.3942700922))
            Line((54.1560311317, -13.3942700922), (54.1560311317, 14.6313095465))
        make_face()
        with BuildLine():
            Line((38.9502607286, -13.3942700922), (38.9502607286, 14.6313095465))
            ThreePointArc((38.9502607286, 14.6313095465), (45.5531459302, 21.2341947481), (52.1560311317, 14.6313095465))
            Line((52.1560311317, 14.6313095465), (52.1560311317, -13.3942700922))
            ThreePointArc((52.1560311317, -13.3942700922), (45.5531459302, -19.9971552938), (38.9502607286, -13.3942700922))
        make_face(mode=Mode.SUBTRACT)
        with BuildLine():
            ThreePointArc((-25.707639439, 40.2631011141), (-28.4799020501, 36.5361613442), (-30.7072781513, 32.4600951356))
            ThreePointArc((-30.7072781513, 32.4600951356), (-32.2715668081, 28.3608780057), (-33.284017822, 24.0917419076))
            Line((-33.284017822, 24.0917419076), (33.284017822, 24.0917419076))
            ThreePointArc((33.284017822, 24.0917419076), (32.2715668081, 28.3608780057), (30.7072781513, 32.4600951356))
            ThreePointArc((30.7072781513, 32.4600951356), (28.4799020501, 36.5361613442), (25.707639439, 40.2631011141))
            Line((25.707639439, 40.2631011141), (32.7907345238, 47.3461961989))
            ThreePointArc((32.7907345238, 47.3461961989), (32.7907345238, 54.0008685532), (26.1360621695, 54.0008685532))
            Line((26.1360621695, 54.0008685532), (18.6145214728, 46.4793278565))
            ThreePointArc((18.6145214728, 46.4793278565), (9.708938731, 50.565820618), (0, 51.8869321878))
            ThreePointArc((0, 51.8869321878), (-9.708938731, 50.565820618), (-18.6145214728, 46.4793278565))
            Line((-18.6145214728, 46.4793278565), (-26.1360621695, 54.0008685532))
            ThreePointArc((-26.1360621695, 54.0008685532), (-32.7907345238, 54.0008685532), (-32.7907345238, 47.3461961989))
            Line((-32.7907345238, 47.3461961989), (-25.707639439, 40.2631011141))
        make_face()
        with BuildLine():
            ThreePointArc((16.0106173244, 38.8369633325), (9.6142565188, 37.4559091891), (16.0106173244, 36.0748550456))
            Line((16.0106173244, 36.0748550456), (26.7508904588, 36.0748550456))
            ThreePointArc((26.7508904588, 36.0748550456), (29.4383336901, 31.1322164007), (31.2078986317, 25.7917419076))
            Line((31.2078986317, 25.7917419076), (-31.2078986317, 25.7917419076))
            ThreePointArc((-31.2078986317, 25.7917419076), (-29.4383336901, 31.1322164007), (-26.7508904588, 36.0748550456))
            Line((-26.7508904588, 36.0748550456), (-16.0106173244, 36.0748550456))
            ThreePointArc((-16.0106173244, 36.0748550456), (-9.6142565188, 37.4559091891), (-16.0106173244, 38.8369633325))
            Line((-16.0106173244, 38.8369633325), (-24.6877279792, 38.8369633325))
            ThreePointArc((-24.6877279792, 38.8369633325), (-24.0375361692, 39.5906852357), (-23.3639563844, 40.3235811155))
            Line((-23.3639563844, 40.3235811155), (-31.5886529958, 48.5482777269))
            ThreePointArc((-31.5886529958, 48.5482777269), (-31.5886529958, 52.7987870252), (-27.3381436975, 52.7987870252))
            Line((-27.3381436975, 52.7987870252), (-18.8199247983, 44.2805681259))
            ThreePointArc((-18.8199247983, 44.2805681259), (-9.8819802161, 48.7377457179), (0, 50.1867979765))
            ThreePointArc((0, 50.1867979765), (9.8819802161, 48.7377457179), (18.8199247983, 44.2805681259))
            Line((18.8199247983, 44.2805681259), (27.3381436975, 52.7987870252))
            ThreePointArc((27.3381436975, 52.7987870252), (31.5886529958, 52.7987870252), (31.5886529958, 48.5482777269))
            Line((31.5886529958, 48.5482777269), (23.3639563844, 40.3235811155))
            ThreePointArc((23.3639563844, 40.3235811155), (24.0375361692, 39.5906852357), (24.6877279792, 38.8369633325))
            Line((24.6877279792, 38.8369633325), (16.0106173244, 38.8369633325))
        make_face(mode=Mode.SUBTRACT)
    extrude(amount=F5_DEPTH)


with BuildPart() as f1_1:
    # F6: moved
    add(f1.part.scale(F6_SCALE))


solid = f1_1.part
